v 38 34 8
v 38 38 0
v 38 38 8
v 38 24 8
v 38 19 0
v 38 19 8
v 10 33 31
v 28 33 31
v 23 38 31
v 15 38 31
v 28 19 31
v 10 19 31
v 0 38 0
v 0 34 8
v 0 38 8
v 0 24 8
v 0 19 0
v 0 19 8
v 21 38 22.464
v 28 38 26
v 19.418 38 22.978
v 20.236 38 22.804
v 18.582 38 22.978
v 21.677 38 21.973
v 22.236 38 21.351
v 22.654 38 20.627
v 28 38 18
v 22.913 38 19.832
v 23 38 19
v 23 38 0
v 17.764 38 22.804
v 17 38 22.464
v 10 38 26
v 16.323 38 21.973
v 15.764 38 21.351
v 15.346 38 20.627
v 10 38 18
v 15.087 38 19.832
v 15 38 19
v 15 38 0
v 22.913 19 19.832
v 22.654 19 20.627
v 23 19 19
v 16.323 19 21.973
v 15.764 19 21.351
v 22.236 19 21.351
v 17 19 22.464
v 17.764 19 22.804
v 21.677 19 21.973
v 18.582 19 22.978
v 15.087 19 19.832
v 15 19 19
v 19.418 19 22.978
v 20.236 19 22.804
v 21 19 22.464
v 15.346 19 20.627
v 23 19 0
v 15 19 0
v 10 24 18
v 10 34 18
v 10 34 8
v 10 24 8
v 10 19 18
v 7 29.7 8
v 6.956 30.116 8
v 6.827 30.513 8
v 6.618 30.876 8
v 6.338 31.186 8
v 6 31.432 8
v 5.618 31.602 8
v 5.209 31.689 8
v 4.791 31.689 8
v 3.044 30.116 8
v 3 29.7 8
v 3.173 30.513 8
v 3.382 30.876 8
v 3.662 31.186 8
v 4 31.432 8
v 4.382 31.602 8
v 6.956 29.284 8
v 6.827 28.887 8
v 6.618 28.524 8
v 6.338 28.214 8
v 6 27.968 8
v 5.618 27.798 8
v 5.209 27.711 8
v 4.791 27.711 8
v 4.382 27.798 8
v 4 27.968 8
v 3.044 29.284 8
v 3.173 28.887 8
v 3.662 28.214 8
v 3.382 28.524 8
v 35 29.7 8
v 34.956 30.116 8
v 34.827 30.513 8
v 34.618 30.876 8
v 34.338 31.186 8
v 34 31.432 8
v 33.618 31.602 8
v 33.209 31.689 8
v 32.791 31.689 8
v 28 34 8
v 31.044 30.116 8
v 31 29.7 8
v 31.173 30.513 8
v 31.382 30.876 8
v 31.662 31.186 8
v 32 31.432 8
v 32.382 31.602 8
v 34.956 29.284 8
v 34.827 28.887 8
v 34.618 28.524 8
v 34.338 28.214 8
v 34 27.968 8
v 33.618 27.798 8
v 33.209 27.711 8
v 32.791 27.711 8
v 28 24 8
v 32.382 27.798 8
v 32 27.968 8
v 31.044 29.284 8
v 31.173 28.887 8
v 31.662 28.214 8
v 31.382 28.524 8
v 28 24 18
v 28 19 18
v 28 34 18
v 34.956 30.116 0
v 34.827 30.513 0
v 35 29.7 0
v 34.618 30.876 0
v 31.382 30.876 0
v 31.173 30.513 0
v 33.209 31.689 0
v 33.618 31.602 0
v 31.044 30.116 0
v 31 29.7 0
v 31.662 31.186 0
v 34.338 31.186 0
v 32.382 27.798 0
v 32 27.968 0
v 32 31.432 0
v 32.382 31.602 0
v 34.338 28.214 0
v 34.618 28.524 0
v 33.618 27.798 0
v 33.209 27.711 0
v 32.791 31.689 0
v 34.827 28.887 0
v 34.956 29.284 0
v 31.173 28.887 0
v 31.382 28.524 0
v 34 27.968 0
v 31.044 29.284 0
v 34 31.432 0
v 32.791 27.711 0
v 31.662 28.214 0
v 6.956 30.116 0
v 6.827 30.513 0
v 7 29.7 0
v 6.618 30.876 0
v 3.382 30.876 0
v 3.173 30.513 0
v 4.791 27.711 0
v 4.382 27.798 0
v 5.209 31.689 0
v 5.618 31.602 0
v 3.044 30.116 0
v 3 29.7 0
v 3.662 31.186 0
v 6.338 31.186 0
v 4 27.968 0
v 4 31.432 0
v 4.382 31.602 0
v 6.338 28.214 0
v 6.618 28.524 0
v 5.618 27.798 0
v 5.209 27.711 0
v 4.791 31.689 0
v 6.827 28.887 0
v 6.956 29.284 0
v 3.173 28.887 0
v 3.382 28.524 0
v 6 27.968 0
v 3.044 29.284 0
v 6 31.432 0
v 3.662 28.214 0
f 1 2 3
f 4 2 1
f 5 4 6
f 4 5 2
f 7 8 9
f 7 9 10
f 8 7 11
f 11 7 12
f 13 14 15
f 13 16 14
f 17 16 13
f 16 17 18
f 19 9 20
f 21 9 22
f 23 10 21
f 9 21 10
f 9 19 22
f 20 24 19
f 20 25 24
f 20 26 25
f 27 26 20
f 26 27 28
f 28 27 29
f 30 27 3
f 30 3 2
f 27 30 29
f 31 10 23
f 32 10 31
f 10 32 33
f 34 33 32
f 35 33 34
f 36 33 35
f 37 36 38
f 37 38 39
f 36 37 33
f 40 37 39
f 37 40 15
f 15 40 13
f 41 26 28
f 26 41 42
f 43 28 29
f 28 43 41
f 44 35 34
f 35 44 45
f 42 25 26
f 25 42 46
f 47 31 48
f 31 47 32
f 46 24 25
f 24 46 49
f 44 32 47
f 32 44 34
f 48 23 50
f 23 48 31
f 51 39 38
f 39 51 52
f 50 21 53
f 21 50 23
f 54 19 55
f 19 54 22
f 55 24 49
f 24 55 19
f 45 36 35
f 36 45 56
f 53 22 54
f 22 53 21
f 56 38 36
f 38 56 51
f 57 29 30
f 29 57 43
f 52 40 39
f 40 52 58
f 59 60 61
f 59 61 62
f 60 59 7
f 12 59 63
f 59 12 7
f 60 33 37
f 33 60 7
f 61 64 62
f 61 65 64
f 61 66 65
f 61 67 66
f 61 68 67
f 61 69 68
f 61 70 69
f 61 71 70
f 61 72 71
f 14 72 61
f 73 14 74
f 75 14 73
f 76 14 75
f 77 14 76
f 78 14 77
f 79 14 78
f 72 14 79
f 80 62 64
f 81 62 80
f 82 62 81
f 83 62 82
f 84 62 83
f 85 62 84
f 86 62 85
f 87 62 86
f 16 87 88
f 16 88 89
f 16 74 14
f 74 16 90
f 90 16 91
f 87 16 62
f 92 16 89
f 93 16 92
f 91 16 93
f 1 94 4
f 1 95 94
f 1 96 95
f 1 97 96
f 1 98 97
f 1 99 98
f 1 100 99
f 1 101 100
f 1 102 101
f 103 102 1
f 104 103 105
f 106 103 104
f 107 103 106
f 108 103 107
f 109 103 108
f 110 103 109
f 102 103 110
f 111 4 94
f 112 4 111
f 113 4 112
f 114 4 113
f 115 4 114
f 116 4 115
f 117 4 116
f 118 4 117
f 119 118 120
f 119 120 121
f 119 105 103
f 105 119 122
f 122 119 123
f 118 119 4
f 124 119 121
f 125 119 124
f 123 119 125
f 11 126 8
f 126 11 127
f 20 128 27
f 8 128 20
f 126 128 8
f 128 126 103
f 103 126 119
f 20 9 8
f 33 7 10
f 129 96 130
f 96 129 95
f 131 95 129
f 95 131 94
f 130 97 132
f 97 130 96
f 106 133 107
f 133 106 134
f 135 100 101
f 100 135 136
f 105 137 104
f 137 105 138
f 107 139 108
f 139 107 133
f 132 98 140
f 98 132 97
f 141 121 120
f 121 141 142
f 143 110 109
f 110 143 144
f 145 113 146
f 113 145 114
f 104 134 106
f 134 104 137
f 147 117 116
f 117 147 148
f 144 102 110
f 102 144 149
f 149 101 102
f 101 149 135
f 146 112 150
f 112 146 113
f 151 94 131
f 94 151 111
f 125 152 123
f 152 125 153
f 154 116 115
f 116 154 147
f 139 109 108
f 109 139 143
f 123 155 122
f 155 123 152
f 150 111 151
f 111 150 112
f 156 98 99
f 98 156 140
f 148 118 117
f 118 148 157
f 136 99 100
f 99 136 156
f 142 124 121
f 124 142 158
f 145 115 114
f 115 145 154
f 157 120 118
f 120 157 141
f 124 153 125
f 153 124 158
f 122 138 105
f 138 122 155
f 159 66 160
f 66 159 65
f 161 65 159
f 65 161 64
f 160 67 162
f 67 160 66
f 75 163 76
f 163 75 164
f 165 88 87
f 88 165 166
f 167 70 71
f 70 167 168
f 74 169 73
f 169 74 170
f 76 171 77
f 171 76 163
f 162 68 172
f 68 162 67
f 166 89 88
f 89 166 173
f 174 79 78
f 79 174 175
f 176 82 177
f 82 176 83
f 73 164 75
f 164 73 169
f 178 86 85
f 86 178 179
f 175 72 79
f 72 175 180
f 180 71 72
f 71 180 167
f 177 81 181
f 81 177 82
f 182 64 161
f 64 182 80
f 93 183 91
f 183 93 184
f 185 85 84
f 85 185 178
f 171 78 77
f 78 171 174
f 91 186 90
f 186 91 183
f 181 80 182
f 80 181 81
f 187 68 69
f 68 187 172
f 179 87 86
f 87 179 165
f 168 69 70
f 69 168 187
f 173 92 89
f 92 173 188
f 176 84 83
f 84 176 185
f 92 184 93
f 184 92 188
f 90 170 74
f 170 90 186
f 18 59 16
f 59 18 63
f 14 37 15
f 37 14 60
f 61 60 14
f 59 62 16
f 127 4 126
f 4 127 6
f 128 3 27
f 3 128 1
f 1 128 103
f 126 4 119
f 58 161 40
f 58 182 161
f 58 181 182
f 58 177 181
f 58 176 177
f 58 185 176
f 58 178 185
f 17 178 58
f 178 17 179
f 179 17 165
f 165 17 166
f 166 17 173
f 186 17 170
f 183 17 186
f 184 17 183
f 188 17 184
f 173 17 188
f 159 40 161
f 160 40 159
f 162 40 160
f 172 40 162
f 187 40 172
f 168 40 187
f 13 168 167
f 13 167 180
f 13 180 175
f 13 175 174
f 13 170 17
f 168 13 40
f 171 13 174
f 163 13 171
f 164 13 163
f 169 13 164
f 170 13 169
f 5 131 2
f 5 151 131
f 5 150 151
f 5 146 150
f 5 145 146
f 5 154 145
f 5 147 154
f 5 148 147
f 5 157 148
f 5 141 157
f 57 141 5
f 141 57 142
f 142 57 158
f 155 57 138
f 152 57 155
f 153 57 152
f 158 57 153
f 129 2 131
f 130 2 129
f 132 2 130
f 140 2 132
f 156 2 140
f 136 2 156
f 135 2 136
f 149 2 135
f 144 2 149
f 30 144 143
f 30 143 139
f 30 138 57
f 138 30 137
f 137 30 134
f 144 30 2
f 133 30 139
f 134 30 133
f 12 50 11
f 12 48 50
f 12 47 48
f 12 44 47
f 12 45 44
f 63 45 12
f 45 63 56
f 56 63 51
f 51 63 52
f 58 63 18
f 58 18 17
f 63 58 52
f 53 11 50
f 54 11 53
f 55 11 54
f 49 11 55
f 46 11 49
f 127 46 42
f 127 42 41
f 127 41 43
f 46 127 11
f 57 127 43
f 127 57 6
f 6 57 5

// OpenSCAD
difference() {
    difference() {
        translate([0,0,-1]){
            difference() {
                difference() {
                    difference() {
                        cube([38,38,32]);
                        translate([19,39
                        ,20])rotate([90,0,0])cylinder(h=40, r=4, $fs=0.01);
                        translate([15,-1,0])cube([8,40,20]);
                        translate([0,-1,9])cube([10,40,30]);
                        translate([28,-1,9])cube([10,40,30]);
                    }
                }

                difference() {
                    translate([10,0,27])cube([18,10,5]);
                    translate([19,9,27])cylinder(5,18,13,$fn=4);
                }
                translate([0,28,0])difference() {
                    translate([10,0,27])cube([18,10,5]);
                    translate([19,1,27])cylinder(5,18,13,$fn=4);
                }

                translate([33,8.3,0])cylinder(h=12, r=2, $fs=0.01);
                translate([33,29.7,0])cylinder(h=12, r=2, $fs=0.01);
                translate([5,8.3,0])cylinder(h=12, r=2, $fs=0.01);
                translate([5,29.7,0])cylinder(h=12, r=2, $fs=0.01);
                
            }

            difference() {
                translate([0,0,9])intersection() {
                    rotate([0,45,0])cube([15,38,15]);
                    cube([10,38,10]);
                }
                translate([0,24,9])cube([10,10,10]);
            }


            rotate([0,90,0])difference() {
                translate([-19,0,28])intersection() {
                    rotate([0,45,0])cube([15,38,15]);
                    cube([10,38,10]);
                }
                translate([-19,24,28])cube([10,10,10]);
            }
        }
        translate([0,0,-5])cube([40,40,5]);
    }
    cube([40,19,40]);
}
